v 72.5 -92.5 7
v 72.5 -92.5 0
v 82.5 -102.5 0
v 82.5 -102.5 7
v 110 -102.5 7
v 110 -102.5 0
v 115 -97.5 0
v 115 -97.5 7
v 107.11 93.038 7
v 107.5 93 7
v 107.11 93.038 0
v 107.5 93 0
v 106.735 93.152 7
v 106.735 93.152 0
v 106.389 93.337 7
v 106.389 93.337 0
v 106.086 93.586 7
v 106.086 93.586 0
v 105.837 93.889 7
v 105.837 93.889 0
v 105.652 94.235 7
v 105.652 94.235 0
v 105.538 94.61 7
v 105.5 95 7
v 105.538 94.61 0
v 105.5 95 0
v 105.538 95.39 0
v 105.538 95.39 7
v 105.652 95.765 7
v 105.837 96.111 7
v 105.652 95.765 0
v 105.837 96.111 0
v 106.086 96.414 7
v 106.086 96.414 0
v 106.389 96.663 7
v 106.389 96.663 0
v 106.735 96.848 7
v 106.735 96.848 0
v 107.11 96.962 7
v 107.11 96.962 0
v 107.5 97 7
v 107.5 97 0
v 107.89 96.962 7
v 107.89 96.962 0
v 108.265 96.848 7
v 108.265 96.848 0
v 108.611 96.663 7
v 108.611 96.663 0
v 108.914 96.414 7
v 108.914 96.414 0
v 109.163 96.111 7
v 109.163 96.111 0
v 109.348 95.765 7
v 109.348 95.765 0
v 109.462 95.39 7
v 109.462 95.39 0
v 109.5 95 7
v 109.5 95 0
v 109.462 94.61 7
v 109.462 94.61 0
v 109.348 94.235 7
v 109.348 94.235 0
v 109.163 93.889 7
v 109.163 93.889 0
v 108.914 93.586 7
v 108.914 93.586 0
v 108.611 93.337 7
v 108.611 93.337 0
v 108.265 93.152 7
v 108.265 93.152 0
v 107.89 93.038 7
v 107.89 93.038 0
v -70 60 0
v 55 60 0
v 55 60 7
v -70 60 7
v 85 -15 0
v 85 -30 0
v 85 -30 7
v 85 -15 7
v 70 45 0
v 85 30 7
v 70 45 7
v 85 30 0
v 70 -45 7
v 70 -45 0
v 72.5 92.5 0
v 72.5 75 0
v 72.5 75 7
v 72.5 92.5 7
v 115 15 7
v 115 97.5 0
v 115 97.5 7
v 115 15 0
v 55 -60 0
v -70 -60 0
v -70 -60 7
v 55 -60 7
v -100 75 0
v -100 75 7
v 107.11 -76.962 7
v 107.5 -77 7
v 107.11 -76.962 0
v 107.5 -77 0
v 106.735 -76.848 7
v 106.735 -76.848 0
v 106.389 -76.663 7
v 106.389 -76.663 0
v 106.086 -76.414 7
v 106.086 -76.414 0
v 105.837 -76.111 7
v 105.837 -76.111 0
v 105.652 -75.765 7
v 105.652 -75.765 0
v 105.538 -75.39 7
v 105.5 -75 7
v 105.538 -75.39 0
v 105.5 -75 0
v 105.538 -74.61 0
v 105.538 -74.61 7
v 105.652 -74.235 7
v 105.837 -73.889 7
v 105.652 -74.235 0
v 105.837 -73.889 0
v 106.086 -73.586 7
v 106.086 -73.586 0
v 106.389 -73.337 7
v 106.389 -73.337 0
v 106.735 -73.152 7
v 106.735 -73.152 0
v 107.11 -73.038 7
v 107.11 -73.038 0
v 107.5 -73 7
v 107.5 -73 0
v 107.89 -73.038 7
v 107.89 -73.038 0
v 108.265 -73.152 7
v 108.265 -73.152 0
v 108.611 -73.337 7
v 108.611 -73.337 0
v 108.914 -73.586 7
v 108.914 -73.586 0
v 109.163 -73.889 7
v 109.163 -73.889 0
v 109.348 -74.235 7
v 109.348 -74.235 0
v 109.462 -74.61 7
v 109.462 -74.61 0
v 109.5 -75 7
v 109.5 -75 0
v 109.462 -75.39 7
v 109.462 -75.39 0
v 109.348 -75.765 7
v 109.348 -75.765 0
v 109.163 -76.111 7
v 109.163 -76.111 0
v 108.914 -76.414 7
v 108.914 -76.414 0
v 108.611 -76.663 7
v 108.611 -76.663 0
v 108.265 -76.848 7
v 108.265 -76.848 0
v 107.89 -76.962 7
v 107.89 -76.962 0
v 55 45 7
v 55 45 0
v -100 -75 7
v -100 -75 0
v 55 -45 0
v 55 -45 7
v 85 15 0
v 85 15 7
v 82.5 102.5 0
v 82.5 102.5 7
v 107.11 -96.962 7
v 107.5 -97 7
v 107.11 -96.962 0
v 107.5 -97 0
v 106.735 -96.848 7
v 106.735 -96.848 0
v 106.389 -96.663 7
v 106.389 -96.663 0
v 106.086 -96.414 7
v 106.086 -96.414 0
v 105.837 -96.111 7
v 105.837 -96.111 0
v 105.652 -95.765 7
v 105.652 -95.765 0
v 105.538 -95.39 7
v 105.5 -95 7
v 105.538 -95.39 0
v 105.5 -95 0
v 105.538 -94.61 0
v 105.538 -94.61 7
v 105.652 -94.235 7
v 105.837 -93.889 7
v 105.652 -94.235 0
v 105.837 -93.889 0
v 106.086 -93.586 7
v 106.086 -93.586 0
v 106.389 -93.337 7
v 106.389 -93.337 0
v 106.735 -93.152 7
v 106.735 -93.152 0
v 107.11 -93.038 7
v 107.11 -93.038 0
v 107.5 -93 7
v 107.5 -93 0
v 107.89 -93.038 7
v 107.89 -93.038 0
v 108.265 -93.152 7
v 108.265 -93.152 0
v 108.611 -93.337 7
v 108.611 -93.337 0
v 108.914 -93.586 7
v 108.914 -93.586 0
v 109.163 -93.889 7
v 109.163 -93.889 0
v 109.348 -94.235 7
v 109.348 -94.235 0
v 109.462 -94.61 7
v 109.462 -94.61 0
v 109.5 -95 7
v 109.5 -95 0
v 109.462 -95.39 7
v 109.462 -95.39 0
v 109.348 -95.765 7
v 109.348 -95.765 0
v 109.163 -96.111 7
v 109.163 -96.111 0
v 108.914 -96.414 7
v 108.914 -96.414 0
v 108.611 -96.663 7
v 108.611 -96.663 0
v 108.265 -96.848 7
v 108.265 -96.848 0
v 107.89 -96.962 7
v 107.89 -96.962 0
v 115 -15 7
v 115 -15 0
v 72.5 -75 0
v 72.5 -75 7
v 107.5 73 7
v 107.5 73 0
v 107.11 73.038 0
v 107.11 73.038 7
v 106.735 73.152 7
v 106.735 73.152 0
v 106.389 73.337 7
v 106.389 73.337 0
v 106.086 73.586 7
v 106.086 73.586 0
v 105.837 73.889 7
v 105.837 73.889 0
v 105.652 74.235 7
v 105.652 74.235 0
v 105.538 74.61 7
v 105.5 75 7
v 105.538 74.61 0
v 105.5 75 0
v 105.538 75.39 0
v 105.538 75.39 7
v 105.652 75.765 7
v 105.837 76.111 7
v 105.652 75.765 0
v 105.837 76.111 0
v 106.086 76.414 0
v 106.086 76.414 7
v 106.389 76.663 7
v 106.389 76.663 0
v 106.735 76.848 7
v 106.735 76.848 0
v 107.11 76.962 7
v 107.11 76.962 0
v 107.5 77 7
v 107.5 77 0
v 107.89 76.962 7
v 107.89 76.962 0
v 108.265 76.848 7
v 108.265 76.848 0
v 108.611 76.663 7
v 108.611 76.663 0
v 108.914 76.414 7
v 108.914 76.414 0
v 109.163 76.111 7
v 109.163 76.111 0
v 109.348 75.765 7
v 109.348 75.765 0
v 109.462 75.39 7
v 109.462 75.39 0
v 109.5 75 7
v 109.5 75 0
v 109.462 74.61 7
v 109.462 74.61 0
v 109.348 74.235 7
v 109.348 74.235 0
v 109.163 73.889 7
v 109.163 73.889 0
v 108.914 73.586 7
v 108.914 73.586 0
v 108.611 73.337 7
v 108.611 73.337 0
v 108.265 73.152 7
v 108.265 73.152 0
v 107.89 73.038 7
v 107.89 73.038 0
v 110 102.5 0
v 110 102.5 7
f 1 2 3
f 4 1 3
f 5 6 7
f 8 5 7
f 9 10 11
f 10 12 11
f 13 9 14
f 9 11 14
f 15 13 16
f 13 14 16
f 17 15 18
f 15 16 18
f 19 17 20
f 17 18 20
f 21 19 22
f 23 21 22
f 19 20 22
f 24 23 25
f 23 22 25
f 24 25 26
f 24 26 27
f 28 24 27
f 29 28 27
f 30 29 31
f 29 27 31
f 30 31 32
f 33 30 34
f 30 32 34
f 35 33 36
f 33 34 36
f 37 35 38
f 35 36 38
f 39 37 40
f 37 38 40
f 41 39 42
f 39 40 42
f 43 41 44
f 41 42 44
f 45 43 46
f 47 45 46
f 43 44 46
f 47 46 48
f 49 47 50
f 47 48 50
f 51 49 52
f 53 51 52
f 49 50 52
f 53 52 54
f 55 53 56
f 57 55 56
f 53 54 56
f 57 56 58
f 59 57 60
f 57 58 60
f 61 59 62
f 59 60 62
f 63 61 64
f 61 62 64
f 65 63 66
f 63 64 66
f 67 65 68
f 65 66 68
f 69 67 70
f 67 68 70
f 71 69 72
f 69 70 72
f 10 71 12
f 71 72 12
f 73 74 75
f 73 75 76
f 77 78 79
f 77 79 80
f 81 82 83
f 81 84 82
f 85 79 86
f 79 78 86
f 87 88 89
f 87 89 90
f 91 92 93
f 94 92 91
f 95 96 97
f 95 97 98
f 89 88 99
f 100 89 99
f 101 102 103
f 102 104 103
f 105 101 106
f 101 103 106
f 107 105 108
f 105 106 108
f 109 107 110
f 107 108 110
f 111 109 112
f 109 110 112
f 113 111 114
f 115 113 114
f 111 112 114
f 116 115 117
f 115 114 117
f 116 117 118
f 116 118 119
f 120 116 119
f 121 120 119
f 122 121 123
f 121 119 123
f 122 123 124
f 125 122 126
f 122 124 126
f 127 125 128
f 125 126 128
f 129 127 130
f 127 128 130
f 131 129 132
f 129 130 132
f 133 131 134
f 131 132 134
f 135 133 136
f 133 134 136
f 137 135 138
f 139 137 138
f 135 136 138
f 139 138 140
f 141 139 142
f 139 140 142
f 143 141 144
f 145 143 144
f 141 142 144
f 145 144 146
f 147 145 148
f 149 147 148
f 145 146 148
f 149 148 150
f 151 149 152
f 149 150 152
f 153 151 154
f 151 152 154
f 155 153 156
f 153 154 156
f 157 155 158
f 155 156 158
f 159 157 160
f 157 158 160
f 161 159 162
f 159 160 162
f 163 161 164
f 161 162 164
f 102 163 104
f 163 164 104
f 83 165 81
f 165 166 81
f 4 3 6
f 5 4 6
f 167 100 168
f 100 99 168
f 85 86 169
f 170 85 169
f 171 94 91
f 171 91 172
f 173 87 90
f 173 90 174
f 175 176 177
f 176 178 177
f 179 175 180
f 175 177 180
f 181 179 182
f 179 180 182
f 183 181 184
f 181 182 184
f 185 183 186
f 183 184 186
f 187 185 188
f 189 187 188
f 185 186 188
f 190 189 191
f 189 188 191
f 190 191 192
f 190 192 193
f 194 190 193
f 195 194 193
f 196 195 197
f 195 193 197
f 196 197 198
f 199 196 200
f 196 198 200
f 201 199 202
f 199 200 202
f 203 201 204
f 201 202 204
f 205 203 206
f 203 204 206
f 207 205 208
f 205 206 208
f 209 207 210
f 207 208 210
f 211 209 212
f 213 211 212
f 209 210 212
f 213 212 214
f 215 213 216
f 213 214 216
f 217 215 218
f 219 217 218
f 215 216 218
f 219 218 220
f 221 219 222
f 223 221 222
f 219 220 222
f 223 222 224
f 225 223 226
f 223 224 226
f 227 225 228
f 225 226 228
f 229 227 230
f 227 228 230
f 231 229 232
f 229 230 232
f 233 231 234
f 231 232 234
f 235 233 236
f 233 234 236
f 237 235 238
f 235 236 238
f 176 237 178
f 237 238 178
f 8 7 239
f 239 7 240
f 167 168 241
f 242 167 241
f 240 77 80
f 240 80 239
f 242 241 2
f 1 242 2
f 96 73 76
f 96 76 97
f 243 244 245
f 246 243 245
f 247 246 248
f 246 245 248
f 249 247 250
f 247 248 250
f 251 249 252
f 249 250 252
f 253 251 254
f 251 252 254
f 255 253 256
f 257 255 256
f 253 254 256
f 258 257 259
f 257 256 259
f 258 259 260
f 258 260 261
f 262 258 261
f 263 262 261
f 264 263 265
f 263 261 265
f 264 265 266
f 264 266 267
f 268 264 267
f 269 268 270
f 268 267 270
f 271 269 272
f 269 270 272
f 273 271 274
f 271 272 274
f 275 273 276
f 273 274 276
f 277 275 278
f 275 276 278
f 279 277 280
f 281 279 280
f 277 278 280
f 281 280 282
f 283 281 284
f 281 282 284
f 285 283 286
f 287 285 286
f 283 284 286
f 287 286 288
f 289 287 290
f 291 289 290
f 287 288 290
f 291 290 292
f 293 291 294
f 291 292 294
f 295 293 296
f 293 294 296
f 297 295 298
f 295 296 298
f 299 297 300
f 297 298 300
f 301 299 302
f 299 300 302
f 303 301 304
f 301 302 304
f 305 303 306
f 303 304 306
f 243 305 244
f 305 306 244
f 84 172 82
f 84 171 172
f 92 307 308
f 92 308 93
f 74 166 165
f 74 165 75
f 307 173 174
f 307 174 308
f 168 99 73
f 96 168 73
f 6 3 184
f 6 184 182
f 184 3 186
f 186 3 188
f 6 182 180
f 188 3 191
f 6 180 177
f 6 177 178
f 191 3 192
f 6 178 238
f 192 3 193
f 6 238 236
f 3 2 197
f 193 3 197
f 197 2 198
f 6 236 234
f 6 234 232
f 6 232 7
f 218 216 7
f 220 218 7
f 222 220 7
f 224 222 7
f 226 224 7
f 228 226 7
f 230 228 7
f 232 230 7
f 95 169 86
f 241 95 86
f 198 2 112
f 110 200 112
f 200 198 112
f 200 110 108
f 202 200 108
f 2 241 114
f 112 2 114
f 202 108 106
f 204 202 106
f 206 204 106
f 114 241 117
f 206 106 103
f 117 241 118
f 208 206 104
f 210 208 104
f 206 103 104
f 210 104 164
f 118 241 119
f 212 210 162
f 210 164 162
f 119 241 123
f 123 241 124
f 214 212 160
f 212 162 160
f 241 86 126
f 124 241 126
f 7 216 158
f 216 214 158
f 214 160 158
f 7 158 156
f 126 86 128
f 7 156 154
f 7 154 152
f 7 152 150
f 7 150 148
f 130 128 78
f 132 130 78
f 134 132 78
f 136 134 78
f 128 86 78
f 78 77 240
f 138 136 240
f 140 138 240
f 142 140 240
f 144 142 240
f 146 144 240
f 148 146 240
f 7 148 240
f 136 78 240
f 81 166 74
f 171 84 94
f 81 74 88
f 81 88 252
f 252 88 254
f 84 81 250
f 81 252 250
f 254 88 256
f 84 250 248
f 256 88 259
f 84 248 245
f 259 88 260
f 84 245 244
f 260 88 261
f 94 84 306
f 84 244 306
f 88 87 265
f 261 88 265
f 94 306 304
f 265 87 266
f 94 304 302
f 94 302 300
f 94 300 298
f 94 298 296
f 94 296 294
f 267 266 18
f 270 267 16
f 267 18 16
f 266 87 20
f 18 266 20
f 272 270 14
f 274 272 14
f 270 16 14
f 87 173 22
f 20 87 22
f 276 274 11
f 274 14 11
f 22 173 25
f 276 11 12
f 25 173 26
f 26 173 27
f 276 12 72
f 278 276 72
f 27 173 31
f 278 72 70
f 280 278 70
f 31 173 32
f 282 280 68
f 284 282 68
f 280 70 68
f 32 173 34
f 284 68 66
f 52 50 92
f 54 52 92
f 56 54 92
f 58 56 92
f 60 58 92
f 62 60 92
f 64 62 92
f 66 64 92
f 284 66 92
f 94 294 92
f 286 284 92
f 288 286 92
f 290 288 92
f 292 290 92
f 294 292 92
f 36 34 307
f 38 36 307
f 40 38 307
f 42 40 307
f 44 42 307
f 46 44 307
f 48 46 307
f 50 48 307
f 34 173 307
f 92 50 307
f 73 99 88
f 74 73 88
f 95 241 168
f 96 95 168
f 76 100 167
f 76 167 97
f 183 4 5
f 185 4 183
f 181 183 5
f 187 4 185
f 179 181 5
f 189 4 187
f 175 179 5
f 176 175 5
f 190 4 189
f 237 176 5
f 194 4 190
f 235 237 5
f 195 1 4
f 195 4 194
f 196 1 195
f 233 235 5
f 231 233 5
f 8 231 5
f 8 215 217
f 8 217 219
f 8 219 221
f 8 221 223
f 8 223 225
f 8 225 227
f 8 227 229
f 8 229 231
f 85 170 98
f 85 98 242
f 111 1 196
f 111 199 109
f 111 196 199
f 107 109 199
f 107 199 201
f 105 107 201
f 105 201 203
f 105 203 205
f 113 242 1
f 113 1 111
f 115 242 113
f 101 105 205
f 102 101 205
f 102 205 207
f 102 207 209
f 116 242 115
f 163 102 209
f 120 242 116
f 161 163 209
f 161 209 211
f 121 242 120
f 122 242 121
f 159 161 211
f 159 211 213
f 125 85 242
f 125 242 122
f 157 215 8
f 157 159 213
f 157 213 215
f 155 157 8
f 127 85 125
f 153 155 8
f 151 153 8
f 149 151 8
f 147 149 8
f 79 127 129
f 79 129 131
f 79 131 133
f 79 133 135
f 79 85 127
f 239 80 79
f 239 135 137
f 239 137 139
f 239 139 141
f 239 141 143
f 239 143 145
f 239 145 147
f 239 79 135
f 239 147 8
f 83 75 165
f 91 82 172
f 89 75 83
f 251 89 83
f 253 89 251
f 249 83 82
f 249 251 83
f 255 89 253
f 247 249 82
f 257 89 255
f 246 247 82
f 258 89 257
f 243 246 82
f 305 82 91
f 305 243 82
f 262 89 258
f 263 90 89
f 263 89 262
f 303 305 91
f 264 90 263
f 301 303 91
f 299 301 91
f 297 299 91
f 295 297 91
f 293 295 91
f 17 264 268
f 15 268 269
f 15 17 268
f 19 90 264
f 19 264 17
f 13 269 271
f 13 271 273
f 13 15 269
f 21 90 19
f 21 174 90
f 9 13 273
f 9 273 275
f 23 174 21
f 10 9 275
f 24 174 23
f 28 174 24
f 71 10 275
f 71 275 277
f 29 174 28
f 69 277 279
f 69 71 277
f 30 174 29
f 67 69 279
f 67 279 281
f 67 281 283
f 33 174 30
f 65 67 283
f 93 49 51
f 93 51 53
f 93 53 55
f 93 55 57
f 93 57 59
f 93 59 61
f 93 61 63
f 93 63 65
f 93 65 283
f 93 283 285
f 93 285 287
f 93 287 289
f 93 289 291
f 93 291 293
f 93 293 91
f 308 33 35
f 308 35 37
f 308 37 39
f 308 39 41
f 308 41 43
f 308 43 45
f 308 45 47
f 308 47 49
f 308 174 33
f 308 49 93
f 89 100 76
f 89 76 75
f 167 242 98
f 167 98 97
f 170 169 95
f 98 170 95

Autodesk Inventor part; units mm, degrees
ref_plane "YZ Plane" through (0, 0, 0) normal (1, 0, 0) x (0, 1, 0)
ref_plane "XZ Plane" through (0, 0, 0) normal (0, 1, 0) x (-1, 0, 0)
ref_plane "XY Plane" through (0, 0, 0) normal (0, 0, 1) x (1, 0, 0)
sketch "Sketch1" plane through (0, 0, 0) normal (0, 0, 1) x (1, 0, 0)
  line L0 (-100, -75) -> (100, -75) projected
  line L1 (100, -75) -> (100, 75) projected
  line L2 (100, 75) -> (-100, 75) projected
  line L3 (-100, 75) -> (-100, -75) projected
  line L4 (-70, -60) -> (55, -60)
  line L5 (55, 60) -> (-70, 60)
  line L6 (-70, 60) -> (-70, 15)
  line L7 (-70, -15) -> (-70, -60)
  line L8 (151.2343, 15) -> (1.2343, 15) projected
  line L9 (1.2343, -15) -> (151.2343, -15) projected
  line L10 (85, -30) -> (85, -15)
  line L11 (85, 15) -> (85, 30)
  line L12 (-100, 75) -> (72.5, 75)
  line L13 (72.5, -75) -> (-100, -75)
  line L14 (-100, -75) -> (-100, 75)
  line L15 (100, -15) -> (85, -15)
  line L16 (100, 15) -> (85, 15)
  line L17 (-100, 0) -> (100, 0) construction
  line L18 (70, 45) -> (70, -45) projected
  line L19 (70, -45) -> (-70, -45) projected
  line L20 (-70, -45) -> (-70, 45) projected
  line L21 (-70, 45) -> (70, 45) projected
  line L22 (-70, 15) -> (-70, -15)
  line L23 (85, -30) -> (70, -45)
  line L24 (70, -45) -> (55, -45)
  line L25 (55, -45) -> (55, -60)
  line L26 (85, 30) -> (70, 45)
  line L27 (70, 45) -> (55, 45)
  line L28 (55, 45) -> (55, 60)
  line L29 (100, -102.5) -> (110, -102.5)
  line L30 (115, -97.5) -> (115, -67.5)
  line L31 (110, -102.5) -> (115, -97.5)
  line L32 (100, -15) -> (115, -15)
  line L33 (115, -67.5) -> (115, -15)
  line L34 (72.5, -75) -> (72.5, -92.5)
  line L35 (82.5, -102.5) -> (100, -102.5)
  line L36 (72.5, -92.5) -> (82.5, -102.5)
  line L37 (100, 102.5) -> (110, 102.5)
  line L38 (115, 97.5) -> (115, 67.5)
  line L39 (110, 102.5) -> (115, 97.5)
  line L40 (100, 15) -> (115, 15)
  line L41 (115, 67.5) -> (115, 15)
  line L42 (72.5, 75) -> (72.5, 92.5)
  line L43 (82.5, 102.5) -> (100, 102.5)
  line L44 (72.5, 92.5) -> (82.5, 102.5)
  line L45 (270, -60) -> (395, -60)
  line L46 (395, 60) -> (270, 60)
  line L47 (270, 60) -> (270, 15)
  line L48 (270, -15) -> (270, -60)
  line L49 (425, -30) -> (425, -15)
  line L50 (425, 15) -> (425, 30)
  line L51 (240, 75) -> (412.5, 75)
  line L52 (412.5, -75) -> (240, -75)
  line L53 (240, -75) -> (240, 75)
  line L54 (440, -15) -> (425, -15)
  line L55 (440, 15) -> (425, 15)
  line L56 (240, 0) -> (440, 0) construction
  line L57 (270, 15) -> (270, -15)
  line L58 (425, -30) -> (410, -45)
  line L59 (410, -45) -> (395, -45)
  line L60 (395, -45) -> (395, -60)
  line L61 (395, 45) -> (395, 60)
  line L62 (410, 45) -> (395, 45)
  line L63 (425, 30) -> (410, 45)
  line L64 (440, -102.5) -> (450, -102.5)
  line L65 (455, -97.5) -> (455, -67.5)
  line L66 (450, -102.5) -> (455, -97.5)
  line L67 (440, -15) -> (455, -15)
  line L68 (455, -67.5) -> (455, -15)
  line L69 (412.5, -75) -> (412.5, -92.5)
  line L70 (422.5, -102.5) -> (440, -102.5)
  line L71 (412.5, -92.5) -> (422.5, -102.5)
  line L72 (412.5, 75) -> (412.5, 92.5)
  line L73 (412.5, 92.5) -> (422.5, 102.5)
  line L74 (422.5, 102.5) -> (440, 102.5)
  line L75 (440, 102.5) -> (450, 102.5)
  line L76 (450, 102.5) -> (455, 97.5)
  line L77 (455, 97.5) -> (455, 67.5)
  line L78 (455, 67.5) -> (455, 15)
  line L79 (440, 15) -> (455, 15)
  point P0 (0, 0)
  point P1 (85, -60)
  point P2 (85, 60)
  point P3 (100, 15)
  point P4 (100, -15)
  point P5 (-70, 15)
  point P6 (85, -22.5)
  point P7 (70, 15)
  point P8 (70, -15)
  point P9 (115, -102.5)
  point P10 (100, -55)
  point P11 (107.5, 75)
  point P12 (107.5, 95)
  point P13 (107.5, -75)
  point P14 (107.5, -95)
  point P15 (72.5, -102.5)
  point P16 (425, -60)
  point P17 (425, 60)
  point P18 (425, -22.5)
  point P19 (455, -102.5)
  point P20 (447.5, 75)
  point P21 (447.5, 95)
  point P22 (447.5, -95)
  point P23 (447.5, -75)
  point P24 (412.5, -102.5)
  dimension "d3" = 15
  dimension "d4" = 15
  dimension "d5" = 30
  dimension "d13" = 30
  dimension "d17" = 5
  dimension "d18" = 5
  dimension "d74" = 20
  dimension "d76" = 150
  dimension "d78" = 27.5
  dimension "d79" = 10
  dimension "d80" = 10
  dimension "d81" = 215
  dimension "d94" = 15
  dimension "d95" = 30
  dimension "d96" = 5
  dimension "d97" = 5
  dimension "d98" = 20
  dimension "d99" = 150
  dimension "d100" = 27.5
  dimension "d101" = 10
  dimension "d102" = 10
  dimension "d103" = 215
extrude "Extrusion1" add sketch "Sketch1" along normal blind 7 contours L3 L2 L1 L8 L11 L26 L21 L28 L5 L6 L20 L7 L4 L25 L19 L23 L10 L9 L0 | L0 L1 L9 L33 L30 L31 L29 L35 L36 L34 | L42 L44 L43 L37 L39 L38 L41 L8 L1 L2
sketch "Sketch2" plane through (0, 0, 7) normal (0, 0, 1) x (1, 0, 0)
  line L0 (-70, -60) -> (-70, 60) construction
  line L1 (-70, 0) -> (130.7679, 0) construction
  line L2 (115, -97.5) -> (115, -15) construction
  line L3 (-100, -102.5) -> (110, -102.5) construction
  line L4 (115, -15) -> (85, -15) construction
  point P0 (0, 0)
  point P1 (107.5, -75)
  point P2 (107.5, -95)
  point P3 (107.5, 75)
  point P4 (107.5, 95)
  point P5 (115, -20)
  point P6 (-100, -75)
  point P7 (110, -15)
  point P8 (115, -20)
  point P9 (100, -15)
  dimension "d21" = 7.5
  dimension "d24" = 7.5
  dimension "d32" = 20
  dimension "d73" = 150
hole "Hole1" at (107.5, -75, 7) at (107.5, -95, 7) at (107.5, 75, 7) at (107.5, 95, 7) direction (0, 0, -1) diameter 4 end through all
properties part number "Marco" material "MDF Medium Density Fiberboard"
